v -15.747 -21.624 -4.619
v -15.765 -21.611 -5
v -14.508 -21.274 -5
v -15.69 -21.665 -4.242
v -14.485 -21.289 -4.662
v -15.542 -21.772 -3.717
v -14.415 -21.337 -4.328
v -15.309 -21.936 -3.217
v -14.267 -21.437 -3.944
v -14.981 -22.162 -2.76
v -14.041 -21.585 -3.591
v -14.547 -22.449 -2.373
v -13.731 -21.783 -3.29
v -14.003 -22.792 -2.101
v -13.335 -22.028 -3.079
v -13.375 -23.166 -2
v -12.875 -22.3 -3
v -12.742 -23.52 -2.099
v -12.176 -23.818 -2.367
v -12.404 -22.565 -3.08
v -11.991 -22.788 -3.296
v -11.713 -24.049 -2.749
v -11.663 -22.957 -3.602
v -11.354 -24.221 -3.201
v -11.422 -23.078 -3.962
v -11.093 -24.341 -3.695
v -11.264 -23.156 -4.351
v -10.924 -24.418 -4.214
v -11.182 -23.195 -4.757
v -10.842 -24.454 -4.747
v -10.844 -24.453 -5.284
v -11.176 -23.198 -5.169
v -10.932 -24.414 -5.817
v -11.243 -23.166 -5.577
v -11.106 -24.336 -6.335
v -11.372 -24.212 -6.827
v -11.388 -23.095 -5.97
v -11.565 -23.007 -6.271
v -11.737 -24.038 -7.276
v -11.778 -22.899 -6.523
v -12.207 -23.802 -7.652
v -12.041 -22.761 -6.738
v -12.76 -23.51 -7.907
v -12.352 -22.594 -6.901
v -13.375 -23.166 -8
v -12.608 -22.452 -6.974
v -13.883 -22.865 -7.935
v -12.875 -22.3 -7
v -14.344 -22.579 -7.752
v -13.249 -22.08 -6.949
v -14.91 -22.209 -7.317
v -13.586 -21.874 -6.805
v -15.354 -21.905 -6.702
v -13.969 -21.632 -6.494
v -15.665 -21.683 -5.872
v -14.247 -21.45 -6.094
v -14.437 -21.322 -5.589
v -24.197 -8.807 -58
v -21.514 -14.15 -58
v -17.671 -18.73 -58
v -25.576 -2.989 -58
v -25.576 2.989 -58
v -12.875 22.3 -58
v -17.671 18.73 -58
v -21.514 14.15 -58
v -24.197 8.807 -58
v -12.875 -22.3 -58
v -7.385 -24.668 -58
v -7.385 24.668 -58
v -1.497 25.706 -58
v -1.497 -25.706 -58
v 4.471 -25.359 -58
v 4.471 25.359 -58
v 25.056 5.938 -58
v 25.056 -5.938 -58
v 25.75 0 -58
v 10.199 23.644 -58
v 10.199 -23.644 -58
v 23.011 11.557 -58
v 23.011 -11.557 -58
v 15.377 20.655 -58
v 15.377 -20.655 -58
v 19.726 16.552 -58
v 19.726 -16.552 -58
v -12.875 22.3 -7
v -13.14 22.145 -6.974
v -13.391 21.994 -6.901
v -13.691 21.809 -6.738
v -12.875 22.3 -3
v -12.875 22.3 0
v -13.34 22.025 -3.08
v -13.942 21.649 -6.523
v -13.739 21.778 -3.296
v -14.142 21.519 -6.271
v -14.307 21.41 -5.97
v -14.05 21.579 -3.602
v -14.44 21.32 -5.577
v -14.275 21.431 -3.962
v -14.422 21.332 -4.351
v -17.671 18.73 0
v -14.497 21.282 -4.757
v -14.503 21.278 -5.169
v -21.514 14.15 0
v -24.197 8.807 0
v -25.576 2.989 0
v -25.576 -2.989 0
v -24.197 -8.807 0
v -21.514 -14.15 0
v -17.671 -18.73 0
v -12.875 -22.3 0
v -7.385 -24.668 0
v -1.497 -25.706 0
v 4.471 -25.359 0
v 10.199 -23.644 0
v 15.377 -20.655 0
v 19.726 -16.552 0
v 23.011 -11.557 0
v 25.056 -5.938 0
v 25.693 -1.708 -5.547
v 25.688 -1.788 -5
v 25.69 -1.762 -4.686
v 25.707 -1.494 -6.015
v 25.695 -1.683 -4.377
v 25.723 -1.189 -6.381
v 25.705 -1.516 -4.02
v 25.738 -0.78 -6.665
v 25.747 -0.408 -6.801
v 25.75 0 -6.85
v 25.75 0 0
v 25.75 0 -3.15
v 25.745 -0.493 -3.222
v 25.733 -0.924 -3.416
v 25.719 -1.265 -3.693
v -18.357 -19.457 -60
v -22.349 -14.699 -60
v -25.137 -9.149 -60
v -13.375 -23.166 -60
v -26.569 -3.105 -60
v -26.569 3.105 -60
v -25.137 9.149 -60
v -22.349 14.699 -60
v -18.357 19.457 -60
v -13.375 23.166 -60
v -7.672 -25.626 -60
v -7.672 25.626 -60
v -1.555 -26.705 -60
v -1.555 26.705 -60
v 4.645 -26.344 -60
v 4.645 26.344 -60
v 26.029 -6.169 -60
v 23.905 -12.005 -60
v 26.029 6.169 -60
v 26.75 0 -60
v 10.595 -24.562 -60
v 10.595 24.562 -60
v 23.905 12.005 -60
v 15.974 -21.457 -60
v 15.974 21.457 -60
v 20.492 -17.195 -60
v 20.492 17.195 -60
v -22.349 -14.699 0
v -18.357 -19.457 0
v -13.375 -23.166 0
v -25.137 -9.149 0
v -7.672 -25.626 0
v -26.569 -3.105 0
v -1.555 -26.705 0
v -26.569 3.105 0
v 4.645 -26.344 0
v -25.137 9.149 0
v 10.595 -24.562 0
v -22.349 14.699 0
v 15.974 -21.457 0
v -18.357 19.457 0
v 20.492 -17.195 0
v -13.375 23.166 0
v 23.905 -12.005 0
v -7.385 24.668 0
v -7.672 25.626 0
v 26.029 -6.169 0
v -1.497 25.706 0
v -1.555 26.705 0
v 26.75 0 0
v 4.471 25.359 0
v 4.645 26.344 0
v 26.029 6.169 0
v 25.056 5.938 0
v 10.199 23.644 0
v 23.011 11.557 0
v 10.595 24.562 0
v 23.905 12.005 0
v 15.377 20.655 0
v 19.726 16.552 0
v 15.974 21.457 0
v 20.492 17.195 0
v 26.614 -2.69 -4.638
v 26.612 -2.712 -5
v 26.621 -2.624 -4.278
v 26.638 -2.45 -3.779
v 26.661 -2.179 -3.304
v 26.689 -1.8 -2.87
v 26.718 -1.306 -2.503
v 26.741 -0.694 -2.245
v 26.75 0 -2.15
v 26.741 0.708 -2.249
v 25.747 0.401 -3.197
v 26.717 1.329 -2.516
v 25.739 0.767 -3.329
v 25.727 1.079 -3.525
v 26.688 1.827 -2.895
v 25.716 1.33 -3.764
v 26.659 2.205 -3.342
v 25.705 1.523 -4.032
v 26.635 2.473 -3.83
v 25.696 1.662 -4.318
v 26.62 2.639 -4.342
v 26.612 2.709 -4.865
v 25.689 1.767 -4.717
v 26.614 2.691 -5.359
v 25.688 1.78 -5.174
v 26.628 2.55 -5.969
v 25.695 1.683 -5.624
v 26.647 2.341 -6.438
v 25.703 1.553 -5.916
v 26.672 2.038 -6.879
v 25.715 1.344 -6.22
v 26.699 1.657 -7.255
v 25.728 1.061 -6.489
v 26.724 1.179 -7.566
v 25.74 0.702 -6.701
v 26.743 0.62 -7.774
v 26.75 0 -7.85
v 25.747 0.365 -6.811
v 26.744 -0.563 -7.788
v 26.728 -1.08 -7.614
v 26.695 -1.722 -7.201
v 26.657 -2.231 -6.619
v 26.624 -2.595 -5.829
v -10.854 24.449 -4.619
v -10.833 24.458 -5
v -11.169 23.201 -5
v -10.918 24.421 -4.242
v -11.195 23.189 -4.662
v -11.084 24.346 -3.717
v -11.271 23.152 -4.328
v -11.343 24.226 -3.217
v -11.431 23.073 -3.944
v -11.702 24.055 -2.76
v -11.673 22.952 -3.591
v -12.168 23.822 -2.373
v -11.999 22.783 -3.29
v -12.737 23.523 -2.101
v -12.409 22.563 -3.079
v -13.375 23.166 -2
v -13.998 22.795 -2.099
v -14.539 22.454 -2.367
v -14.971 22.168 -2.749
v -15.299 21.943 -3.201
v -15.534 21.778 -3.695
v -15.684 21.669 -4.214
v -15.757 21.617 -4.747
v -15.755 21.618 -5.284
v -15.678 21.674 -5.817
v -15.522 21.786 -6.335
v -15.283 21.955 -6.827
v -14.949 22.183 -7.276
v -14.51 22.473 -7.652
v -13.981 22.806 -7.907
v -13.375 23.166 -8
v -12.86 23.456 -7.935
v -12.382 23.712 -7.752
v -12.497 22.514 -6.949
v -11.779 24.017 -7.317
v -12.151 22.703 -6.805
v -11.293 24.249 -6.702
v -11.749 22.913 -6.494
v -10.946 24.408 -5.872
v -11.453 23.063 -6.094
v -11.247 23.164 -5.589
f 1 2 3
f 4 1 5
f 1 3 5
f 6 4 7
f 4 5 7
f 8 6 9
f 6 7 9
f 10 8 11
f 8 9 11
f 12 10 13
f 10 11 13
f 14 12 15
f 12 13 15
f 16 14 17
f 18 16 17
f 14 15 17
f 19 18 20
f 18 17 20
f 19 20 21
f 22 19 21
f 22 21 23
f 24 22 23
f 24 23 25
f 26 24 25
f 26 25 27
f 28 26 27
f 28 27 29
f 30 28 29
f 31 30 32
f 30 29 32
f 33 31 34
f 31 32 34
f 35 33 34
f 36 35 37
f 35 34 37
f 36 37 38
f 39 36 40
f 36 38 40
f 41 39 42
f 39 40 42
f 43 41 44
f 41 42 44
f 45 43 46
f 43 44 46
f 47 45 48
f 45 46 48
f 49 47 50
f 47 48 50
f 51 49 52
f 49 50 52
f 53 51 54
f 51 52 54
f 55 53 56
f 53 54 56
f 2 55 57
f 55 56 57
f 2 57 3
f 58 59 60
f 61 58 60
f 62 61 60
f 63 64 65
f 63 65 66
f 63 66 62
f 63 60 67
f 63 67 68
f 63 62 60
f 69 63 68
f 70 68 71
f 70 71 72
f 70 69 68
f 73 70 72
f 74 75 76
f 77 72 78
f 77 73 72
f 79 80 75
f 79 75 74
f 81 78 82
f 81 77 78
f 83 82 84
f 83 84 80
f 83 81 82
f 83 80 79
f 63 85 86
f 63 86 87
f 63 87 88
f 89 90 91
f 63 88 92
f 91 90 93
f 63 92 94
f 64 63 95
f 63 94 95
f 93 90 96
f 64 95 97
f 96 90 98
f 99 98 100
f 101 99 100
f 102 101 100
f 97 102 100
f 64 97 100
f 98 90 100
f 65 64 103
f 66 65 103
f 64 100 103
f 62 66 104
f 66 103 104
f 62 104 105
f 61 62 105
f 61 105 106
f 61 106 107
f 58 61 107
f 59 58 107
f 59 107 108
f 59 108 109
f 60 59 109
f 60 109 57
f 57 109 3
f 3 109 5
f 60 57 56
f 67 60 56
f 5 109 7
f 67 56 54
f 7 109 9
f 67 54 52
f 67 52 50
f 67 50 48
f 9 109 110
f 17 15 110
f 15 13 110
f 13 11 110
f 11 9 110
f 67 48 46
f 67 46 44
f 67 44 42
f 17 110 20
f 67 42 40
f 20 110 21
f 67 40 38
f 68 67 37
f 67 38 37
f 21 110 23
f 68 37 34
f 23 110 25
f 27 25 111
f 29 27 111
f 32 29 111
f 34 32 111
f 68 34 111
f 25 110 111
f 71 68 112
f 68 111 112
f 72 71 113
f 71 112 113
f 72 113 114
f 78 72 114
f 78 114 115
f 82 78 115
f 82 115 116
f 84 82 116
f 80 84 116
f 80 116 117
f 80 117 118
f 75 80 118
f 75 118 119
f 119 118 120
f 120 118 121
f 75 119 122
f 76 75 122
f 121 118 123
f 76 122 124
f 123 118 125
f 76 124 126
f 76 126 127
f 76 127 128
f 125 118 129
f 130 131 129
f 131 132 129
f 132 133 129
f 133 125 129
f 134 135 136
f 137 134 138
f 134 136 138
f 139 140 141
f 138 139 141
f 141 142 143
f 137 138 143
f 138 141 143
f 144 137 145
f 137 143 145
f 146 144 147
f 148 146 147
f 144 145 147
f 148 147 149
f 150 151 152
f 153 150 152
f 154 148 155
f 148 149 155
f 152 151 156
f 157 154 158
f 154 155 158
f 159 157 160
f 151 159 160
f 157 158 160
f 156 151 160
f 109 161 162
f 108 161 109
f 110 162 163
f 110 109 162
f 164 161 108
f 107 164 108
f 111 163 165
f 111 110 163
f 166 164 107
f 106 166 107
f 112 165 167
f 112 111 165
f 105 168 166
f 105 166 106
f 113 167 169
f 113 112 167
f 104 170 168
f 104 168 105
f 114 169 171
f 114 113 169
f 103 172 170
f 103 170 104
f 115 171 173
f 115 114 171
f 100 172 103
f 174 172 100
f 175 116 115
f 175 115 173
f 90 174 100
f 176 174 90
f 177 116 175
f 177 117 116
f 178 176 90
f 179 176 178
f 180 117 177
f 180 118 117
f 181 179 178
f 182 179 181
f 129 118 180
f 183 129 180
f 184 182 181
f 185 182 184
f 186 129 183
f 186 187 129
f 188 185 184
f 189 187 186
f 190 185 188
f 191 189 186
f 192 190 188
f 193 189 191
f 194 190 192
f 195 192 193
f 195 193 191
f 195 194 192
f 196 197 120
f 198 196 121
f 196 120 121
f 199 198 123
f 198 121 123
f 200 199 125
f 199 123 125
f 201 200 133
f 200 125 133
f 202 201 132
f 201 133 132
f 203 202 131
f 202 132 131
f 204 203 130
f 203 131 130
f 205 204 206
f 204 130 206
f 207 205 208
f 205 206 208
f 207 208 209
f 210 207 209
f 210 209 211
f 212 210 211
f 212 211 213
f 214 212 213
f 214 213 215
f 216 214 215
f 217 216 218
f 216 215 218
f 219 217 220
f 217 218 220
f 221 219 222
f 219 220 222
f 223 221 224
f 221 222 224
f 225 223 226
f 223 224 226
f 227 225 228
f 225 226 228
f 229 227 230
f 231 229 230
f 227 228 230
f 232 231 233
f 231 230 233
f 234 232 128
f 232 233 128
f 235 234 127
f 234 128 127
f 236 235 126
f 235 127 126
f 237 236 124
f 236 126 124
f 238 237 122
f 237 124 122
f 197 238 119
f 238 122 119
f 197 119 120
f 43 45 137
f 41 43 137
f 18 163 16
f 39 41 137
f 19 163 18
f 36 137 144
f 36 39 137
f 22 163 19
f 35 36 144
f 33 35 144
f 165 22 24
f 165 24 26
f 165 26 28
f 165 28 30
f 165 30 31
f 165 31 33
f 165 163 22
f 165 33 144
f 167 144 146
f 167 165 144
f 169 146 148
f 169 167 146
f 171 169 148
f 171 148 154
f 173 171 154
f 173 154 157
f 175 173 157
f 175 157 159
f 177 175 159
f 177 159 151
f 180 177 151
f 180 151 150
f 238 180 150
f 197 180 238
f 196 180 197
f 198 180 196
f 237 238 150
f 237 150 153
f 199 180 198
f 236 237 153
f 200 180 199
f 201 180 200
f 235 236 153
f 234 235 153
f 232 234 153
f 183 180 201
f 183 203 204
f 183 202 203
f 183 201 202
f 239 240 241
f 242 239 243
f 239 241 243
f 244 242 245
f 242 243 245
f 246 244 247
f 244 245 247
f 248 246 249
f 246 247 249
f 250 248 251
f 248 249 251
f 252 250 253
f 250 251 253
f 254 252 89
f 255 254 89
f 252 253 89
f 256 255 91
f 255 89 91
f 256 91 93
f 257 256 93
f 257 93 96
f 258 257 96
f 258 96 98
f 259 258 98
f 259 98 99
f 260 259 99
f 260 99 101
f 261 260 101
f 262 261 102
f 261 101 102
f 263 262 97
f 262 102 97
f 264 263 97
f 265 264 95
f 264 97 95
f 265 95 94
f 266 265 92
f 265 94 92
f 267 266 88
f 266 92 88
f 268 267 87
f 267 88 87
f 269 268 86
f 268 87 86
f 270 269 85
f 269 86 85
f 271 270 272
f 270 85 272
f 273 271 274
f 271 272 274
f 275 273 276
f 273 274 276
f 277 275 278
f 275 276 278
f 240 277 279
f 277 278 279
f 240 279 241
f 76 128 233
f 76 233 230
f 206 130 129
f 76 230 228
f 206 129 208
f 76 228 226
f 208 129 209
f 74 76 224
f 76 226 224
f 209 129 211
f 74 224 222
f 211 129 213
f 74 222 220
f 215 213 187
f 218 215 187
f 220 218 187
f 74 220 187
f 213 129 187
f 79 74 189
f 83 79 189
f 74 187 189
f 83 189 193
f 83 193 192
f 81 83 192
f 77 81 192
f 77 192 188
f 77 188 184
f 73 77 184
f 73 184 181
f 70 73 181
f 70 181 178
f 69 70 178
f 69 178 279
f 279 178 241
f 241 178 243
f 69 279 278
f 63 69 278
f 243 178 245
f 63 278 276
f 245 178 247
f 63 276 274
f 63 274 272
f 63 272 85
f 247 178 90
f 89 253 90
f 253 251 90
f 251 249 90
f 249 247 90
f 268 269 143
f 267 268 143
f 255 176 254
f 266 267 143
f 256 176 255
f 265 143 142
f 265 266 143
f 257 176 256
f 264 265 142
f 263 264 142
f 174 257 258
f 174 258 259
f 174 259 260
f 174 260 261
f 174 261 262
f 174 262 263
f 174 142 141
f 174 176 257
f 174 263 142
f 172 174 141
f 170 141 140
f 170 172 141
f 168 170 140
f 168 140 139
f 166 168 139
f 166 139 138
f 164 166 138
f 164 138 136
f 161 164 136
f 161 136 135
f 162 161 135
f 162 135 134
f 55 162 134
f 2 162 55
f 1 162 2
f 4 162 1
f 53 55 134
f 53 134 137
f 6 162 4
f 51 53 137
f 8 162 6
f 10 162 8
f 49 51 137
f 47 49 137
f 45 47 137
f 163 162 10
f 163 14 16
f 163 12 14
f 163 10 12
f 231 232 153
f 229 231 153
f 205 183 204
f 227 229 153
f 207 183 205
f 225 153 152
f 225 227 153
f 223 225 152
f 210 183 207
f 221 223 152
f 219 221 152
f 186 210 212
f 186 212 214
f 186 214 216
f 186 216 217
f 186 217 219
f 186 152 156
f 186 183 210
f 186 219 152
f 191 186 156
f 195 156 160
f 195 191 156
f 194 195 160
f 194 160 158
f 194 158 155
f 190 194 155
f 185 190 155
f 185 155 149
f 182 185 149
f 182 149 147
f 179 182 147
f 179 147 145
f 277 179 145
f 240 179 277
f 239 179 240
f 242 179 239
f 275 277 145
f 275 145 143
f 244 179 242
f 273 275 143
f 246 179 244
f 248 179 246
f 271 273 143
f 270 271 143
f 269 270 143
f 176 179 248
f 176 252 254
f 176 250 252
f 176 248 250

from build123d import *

# Parameters (mm, degrees)
F1_DEPTH             = 60
F2_DEPTH             = 58
F9_D                 = 3.2
F9_DEPTH             = 4
F9_CSINK_D           = 6
F9_CSINK_ANGLE       = 90
F9_TIP               = 0.9613769904
F9_ON_F6_D           = 3.2
F9_ON_F6_DEPTH       = 4
F9_ON_F6_CSINK_D     = 6
F9_ON_F6_CSINK_ANGLE = 90
F9_ON_F6_TIP         = 0.9613769904
F9_ON_F8_D           = 3.2
F9_ON_F8_DEPTH       = 4
F9_ON_F8_CSINK_D     = 6
F9_ON_F8_CSINK_ANGLE = 90
F9_ON_F8_TIP         = 0.9613769904


# Not quite as in the source:
# - a feature names something its author has since deleted; it is built from what else it names


with BuildPart() as f1:
    # F0 (on Top) → F1 (new body)
    with BuildSketch(Plane.XY):
        with BuildLine():
            ThreePointArc((-13.375, -23.1661795512), (13.375, -23.1661795512), (26.75, 0))
            ThreePointArc((26.75, 0), (13.375, 23.1661795512), (-13.375, 23.1661795512))
            Line((-13.375, 23.1661795512), (-12.875, 22.3001541474))
            ThreePointArc((-12.875, 22.3001541474), (12.875, 22.3001541474), (25.75, 0))
            ThreePointArc((25.75, 0), (12.875, -22.3001541474), (-12.875, -22.3001541474))
            Line((-12.875, -22.3001541474), (-13.375, -23.1661795512))
        make_face()
        with BuildLine():
            Line((-12.875, 22.3001541474), (-13.375, 23.1661795512))
            ThreePointArc((-13.375, 23.1661795512), (-26.75, 0), (-13.375, -23.1661795512))
            Line((-13.375, -23.1661795512), (-12.875, -22.3001541474))
            ThreePointArc((-12.875, -22.3001541474), (-25.75, 0), (-12.875, 22.3001541474))
        make_face()
        with BuildLine():
            ThreePointArc((25.75, 0), (12.875, 22.3001541474), (-12.875, 22.3001541474))
            Line((-12.875, 22.3001541474), (0, 0))
            Line((0, 0), (-12.875, -22.3001541474))
            ThreePointArc((-12.875, -22.3001541474), (12.875, -22.3001541474), (25.75, 0))
        make_face()
        with BuildLine():
            Line((0, 0), (-12.875, 22.3001541474))
            ThreePointArc((-12.875, 22.3001541474), (-25.75, 0), (-12.875, -22.3001541474))
            Line((-12.875, -22.3001541474), (0, 0))
        make_face()
    extrude(amount=-F1_DEPTH)

    # F0 (on Top) → F2 (cut)
    with BuildSketch(Plane.XY):
        with BuildLine():
            ThreePointArc((25.75, 0), (12.875, 22.3001541474), (-12.875, 22.3001541474))
            Line((-12.875, 22.3001541474), (0, 0))
            Line((0, 0), (-12.875, -22.3001541474))
            ThreePointArc((-12.875, -22.3001541474), (12.875, -22.3001541474), (25.75, 0))
        make_face()
        with BuildLine():
            Line((0, 0), (-12.875, 22.3001541474))
            ThreePointArc((-12.875, 22.3001541474), (-25.75, 0), (-12.875, -22.3001541474))
            Line((-12.875, -22.3001541474), (0, 0))
        make_face()
    extrude(amount=-F2_DEPTH, mode=Mode.SUBTRACT)

    # F9
    with Locations(Plane(origin=(-13.375, 23.1661795512, 0), x_dir=(-0.8660254038, -0.5, 0), z_dir=(-0.5, 0.8660254038, 0))):
        with Locations((0, -5)):
            CounterSinkHole(F9_D / 2, F9_CSINK_D / 2, depth=F9_DEPTH, counter_sink_angle=F9_CSINK_ANGLE)
            with Locations((0, 0, -(F9_DEPTH + F9_TIP / 2))):  # 118° drill point
                Cone(0, F9_D / 2, F9_TIP, mode=Mode.SUBTRACT)

    # F9 on F6
    with Locations(Plane.YZ.offset(26.9)):
        with Locations((0, -5)):
            CounterSinkHole(F9_ON_F6_D / 2, F9_ON_F6_CSINK_D / 2, depth=F9_ON_F6_DEPTH, counter_sink_angle=F9_ON_F6_CSINK_ANGLE)
            with Locations((0, 0, -(F9_ON_F6_DEPTH + F9_ON_F6_TIP / 2))):  # 118° drill point
                Cone(0, F9_ON_F6_D / 2, F9_ON_F6_TIP, mode=Mode.SUBTRACT)

    # F9 on F8
    with Locations(Plane(origin=(-13.375, -23.1661795512, 0), x_dir=(0.8660254038, -0.5, 0), z_dir=(-0.5, -0.8660254038, 0))):
        with Locations((0, -5)):
            CounterSinkHole(F9_ON_F8_D / 2, F9_ON_F8_CSINK_D / 2, depth=F9_ON_F8_DEPTH, counter_sink_angle=F9_ON_F8_CSINK_ANGLE)
            with Locations((0, 0, -(F9_ON_F8_DEPTH + F9_ON_F8_TIP / 2))):  # 118° drill point
                Cone(0, F9_ON_F8_D / 2, F9_ON_F8_TIP, mode=Mode.SUBTRACT)


solid = f1.part
